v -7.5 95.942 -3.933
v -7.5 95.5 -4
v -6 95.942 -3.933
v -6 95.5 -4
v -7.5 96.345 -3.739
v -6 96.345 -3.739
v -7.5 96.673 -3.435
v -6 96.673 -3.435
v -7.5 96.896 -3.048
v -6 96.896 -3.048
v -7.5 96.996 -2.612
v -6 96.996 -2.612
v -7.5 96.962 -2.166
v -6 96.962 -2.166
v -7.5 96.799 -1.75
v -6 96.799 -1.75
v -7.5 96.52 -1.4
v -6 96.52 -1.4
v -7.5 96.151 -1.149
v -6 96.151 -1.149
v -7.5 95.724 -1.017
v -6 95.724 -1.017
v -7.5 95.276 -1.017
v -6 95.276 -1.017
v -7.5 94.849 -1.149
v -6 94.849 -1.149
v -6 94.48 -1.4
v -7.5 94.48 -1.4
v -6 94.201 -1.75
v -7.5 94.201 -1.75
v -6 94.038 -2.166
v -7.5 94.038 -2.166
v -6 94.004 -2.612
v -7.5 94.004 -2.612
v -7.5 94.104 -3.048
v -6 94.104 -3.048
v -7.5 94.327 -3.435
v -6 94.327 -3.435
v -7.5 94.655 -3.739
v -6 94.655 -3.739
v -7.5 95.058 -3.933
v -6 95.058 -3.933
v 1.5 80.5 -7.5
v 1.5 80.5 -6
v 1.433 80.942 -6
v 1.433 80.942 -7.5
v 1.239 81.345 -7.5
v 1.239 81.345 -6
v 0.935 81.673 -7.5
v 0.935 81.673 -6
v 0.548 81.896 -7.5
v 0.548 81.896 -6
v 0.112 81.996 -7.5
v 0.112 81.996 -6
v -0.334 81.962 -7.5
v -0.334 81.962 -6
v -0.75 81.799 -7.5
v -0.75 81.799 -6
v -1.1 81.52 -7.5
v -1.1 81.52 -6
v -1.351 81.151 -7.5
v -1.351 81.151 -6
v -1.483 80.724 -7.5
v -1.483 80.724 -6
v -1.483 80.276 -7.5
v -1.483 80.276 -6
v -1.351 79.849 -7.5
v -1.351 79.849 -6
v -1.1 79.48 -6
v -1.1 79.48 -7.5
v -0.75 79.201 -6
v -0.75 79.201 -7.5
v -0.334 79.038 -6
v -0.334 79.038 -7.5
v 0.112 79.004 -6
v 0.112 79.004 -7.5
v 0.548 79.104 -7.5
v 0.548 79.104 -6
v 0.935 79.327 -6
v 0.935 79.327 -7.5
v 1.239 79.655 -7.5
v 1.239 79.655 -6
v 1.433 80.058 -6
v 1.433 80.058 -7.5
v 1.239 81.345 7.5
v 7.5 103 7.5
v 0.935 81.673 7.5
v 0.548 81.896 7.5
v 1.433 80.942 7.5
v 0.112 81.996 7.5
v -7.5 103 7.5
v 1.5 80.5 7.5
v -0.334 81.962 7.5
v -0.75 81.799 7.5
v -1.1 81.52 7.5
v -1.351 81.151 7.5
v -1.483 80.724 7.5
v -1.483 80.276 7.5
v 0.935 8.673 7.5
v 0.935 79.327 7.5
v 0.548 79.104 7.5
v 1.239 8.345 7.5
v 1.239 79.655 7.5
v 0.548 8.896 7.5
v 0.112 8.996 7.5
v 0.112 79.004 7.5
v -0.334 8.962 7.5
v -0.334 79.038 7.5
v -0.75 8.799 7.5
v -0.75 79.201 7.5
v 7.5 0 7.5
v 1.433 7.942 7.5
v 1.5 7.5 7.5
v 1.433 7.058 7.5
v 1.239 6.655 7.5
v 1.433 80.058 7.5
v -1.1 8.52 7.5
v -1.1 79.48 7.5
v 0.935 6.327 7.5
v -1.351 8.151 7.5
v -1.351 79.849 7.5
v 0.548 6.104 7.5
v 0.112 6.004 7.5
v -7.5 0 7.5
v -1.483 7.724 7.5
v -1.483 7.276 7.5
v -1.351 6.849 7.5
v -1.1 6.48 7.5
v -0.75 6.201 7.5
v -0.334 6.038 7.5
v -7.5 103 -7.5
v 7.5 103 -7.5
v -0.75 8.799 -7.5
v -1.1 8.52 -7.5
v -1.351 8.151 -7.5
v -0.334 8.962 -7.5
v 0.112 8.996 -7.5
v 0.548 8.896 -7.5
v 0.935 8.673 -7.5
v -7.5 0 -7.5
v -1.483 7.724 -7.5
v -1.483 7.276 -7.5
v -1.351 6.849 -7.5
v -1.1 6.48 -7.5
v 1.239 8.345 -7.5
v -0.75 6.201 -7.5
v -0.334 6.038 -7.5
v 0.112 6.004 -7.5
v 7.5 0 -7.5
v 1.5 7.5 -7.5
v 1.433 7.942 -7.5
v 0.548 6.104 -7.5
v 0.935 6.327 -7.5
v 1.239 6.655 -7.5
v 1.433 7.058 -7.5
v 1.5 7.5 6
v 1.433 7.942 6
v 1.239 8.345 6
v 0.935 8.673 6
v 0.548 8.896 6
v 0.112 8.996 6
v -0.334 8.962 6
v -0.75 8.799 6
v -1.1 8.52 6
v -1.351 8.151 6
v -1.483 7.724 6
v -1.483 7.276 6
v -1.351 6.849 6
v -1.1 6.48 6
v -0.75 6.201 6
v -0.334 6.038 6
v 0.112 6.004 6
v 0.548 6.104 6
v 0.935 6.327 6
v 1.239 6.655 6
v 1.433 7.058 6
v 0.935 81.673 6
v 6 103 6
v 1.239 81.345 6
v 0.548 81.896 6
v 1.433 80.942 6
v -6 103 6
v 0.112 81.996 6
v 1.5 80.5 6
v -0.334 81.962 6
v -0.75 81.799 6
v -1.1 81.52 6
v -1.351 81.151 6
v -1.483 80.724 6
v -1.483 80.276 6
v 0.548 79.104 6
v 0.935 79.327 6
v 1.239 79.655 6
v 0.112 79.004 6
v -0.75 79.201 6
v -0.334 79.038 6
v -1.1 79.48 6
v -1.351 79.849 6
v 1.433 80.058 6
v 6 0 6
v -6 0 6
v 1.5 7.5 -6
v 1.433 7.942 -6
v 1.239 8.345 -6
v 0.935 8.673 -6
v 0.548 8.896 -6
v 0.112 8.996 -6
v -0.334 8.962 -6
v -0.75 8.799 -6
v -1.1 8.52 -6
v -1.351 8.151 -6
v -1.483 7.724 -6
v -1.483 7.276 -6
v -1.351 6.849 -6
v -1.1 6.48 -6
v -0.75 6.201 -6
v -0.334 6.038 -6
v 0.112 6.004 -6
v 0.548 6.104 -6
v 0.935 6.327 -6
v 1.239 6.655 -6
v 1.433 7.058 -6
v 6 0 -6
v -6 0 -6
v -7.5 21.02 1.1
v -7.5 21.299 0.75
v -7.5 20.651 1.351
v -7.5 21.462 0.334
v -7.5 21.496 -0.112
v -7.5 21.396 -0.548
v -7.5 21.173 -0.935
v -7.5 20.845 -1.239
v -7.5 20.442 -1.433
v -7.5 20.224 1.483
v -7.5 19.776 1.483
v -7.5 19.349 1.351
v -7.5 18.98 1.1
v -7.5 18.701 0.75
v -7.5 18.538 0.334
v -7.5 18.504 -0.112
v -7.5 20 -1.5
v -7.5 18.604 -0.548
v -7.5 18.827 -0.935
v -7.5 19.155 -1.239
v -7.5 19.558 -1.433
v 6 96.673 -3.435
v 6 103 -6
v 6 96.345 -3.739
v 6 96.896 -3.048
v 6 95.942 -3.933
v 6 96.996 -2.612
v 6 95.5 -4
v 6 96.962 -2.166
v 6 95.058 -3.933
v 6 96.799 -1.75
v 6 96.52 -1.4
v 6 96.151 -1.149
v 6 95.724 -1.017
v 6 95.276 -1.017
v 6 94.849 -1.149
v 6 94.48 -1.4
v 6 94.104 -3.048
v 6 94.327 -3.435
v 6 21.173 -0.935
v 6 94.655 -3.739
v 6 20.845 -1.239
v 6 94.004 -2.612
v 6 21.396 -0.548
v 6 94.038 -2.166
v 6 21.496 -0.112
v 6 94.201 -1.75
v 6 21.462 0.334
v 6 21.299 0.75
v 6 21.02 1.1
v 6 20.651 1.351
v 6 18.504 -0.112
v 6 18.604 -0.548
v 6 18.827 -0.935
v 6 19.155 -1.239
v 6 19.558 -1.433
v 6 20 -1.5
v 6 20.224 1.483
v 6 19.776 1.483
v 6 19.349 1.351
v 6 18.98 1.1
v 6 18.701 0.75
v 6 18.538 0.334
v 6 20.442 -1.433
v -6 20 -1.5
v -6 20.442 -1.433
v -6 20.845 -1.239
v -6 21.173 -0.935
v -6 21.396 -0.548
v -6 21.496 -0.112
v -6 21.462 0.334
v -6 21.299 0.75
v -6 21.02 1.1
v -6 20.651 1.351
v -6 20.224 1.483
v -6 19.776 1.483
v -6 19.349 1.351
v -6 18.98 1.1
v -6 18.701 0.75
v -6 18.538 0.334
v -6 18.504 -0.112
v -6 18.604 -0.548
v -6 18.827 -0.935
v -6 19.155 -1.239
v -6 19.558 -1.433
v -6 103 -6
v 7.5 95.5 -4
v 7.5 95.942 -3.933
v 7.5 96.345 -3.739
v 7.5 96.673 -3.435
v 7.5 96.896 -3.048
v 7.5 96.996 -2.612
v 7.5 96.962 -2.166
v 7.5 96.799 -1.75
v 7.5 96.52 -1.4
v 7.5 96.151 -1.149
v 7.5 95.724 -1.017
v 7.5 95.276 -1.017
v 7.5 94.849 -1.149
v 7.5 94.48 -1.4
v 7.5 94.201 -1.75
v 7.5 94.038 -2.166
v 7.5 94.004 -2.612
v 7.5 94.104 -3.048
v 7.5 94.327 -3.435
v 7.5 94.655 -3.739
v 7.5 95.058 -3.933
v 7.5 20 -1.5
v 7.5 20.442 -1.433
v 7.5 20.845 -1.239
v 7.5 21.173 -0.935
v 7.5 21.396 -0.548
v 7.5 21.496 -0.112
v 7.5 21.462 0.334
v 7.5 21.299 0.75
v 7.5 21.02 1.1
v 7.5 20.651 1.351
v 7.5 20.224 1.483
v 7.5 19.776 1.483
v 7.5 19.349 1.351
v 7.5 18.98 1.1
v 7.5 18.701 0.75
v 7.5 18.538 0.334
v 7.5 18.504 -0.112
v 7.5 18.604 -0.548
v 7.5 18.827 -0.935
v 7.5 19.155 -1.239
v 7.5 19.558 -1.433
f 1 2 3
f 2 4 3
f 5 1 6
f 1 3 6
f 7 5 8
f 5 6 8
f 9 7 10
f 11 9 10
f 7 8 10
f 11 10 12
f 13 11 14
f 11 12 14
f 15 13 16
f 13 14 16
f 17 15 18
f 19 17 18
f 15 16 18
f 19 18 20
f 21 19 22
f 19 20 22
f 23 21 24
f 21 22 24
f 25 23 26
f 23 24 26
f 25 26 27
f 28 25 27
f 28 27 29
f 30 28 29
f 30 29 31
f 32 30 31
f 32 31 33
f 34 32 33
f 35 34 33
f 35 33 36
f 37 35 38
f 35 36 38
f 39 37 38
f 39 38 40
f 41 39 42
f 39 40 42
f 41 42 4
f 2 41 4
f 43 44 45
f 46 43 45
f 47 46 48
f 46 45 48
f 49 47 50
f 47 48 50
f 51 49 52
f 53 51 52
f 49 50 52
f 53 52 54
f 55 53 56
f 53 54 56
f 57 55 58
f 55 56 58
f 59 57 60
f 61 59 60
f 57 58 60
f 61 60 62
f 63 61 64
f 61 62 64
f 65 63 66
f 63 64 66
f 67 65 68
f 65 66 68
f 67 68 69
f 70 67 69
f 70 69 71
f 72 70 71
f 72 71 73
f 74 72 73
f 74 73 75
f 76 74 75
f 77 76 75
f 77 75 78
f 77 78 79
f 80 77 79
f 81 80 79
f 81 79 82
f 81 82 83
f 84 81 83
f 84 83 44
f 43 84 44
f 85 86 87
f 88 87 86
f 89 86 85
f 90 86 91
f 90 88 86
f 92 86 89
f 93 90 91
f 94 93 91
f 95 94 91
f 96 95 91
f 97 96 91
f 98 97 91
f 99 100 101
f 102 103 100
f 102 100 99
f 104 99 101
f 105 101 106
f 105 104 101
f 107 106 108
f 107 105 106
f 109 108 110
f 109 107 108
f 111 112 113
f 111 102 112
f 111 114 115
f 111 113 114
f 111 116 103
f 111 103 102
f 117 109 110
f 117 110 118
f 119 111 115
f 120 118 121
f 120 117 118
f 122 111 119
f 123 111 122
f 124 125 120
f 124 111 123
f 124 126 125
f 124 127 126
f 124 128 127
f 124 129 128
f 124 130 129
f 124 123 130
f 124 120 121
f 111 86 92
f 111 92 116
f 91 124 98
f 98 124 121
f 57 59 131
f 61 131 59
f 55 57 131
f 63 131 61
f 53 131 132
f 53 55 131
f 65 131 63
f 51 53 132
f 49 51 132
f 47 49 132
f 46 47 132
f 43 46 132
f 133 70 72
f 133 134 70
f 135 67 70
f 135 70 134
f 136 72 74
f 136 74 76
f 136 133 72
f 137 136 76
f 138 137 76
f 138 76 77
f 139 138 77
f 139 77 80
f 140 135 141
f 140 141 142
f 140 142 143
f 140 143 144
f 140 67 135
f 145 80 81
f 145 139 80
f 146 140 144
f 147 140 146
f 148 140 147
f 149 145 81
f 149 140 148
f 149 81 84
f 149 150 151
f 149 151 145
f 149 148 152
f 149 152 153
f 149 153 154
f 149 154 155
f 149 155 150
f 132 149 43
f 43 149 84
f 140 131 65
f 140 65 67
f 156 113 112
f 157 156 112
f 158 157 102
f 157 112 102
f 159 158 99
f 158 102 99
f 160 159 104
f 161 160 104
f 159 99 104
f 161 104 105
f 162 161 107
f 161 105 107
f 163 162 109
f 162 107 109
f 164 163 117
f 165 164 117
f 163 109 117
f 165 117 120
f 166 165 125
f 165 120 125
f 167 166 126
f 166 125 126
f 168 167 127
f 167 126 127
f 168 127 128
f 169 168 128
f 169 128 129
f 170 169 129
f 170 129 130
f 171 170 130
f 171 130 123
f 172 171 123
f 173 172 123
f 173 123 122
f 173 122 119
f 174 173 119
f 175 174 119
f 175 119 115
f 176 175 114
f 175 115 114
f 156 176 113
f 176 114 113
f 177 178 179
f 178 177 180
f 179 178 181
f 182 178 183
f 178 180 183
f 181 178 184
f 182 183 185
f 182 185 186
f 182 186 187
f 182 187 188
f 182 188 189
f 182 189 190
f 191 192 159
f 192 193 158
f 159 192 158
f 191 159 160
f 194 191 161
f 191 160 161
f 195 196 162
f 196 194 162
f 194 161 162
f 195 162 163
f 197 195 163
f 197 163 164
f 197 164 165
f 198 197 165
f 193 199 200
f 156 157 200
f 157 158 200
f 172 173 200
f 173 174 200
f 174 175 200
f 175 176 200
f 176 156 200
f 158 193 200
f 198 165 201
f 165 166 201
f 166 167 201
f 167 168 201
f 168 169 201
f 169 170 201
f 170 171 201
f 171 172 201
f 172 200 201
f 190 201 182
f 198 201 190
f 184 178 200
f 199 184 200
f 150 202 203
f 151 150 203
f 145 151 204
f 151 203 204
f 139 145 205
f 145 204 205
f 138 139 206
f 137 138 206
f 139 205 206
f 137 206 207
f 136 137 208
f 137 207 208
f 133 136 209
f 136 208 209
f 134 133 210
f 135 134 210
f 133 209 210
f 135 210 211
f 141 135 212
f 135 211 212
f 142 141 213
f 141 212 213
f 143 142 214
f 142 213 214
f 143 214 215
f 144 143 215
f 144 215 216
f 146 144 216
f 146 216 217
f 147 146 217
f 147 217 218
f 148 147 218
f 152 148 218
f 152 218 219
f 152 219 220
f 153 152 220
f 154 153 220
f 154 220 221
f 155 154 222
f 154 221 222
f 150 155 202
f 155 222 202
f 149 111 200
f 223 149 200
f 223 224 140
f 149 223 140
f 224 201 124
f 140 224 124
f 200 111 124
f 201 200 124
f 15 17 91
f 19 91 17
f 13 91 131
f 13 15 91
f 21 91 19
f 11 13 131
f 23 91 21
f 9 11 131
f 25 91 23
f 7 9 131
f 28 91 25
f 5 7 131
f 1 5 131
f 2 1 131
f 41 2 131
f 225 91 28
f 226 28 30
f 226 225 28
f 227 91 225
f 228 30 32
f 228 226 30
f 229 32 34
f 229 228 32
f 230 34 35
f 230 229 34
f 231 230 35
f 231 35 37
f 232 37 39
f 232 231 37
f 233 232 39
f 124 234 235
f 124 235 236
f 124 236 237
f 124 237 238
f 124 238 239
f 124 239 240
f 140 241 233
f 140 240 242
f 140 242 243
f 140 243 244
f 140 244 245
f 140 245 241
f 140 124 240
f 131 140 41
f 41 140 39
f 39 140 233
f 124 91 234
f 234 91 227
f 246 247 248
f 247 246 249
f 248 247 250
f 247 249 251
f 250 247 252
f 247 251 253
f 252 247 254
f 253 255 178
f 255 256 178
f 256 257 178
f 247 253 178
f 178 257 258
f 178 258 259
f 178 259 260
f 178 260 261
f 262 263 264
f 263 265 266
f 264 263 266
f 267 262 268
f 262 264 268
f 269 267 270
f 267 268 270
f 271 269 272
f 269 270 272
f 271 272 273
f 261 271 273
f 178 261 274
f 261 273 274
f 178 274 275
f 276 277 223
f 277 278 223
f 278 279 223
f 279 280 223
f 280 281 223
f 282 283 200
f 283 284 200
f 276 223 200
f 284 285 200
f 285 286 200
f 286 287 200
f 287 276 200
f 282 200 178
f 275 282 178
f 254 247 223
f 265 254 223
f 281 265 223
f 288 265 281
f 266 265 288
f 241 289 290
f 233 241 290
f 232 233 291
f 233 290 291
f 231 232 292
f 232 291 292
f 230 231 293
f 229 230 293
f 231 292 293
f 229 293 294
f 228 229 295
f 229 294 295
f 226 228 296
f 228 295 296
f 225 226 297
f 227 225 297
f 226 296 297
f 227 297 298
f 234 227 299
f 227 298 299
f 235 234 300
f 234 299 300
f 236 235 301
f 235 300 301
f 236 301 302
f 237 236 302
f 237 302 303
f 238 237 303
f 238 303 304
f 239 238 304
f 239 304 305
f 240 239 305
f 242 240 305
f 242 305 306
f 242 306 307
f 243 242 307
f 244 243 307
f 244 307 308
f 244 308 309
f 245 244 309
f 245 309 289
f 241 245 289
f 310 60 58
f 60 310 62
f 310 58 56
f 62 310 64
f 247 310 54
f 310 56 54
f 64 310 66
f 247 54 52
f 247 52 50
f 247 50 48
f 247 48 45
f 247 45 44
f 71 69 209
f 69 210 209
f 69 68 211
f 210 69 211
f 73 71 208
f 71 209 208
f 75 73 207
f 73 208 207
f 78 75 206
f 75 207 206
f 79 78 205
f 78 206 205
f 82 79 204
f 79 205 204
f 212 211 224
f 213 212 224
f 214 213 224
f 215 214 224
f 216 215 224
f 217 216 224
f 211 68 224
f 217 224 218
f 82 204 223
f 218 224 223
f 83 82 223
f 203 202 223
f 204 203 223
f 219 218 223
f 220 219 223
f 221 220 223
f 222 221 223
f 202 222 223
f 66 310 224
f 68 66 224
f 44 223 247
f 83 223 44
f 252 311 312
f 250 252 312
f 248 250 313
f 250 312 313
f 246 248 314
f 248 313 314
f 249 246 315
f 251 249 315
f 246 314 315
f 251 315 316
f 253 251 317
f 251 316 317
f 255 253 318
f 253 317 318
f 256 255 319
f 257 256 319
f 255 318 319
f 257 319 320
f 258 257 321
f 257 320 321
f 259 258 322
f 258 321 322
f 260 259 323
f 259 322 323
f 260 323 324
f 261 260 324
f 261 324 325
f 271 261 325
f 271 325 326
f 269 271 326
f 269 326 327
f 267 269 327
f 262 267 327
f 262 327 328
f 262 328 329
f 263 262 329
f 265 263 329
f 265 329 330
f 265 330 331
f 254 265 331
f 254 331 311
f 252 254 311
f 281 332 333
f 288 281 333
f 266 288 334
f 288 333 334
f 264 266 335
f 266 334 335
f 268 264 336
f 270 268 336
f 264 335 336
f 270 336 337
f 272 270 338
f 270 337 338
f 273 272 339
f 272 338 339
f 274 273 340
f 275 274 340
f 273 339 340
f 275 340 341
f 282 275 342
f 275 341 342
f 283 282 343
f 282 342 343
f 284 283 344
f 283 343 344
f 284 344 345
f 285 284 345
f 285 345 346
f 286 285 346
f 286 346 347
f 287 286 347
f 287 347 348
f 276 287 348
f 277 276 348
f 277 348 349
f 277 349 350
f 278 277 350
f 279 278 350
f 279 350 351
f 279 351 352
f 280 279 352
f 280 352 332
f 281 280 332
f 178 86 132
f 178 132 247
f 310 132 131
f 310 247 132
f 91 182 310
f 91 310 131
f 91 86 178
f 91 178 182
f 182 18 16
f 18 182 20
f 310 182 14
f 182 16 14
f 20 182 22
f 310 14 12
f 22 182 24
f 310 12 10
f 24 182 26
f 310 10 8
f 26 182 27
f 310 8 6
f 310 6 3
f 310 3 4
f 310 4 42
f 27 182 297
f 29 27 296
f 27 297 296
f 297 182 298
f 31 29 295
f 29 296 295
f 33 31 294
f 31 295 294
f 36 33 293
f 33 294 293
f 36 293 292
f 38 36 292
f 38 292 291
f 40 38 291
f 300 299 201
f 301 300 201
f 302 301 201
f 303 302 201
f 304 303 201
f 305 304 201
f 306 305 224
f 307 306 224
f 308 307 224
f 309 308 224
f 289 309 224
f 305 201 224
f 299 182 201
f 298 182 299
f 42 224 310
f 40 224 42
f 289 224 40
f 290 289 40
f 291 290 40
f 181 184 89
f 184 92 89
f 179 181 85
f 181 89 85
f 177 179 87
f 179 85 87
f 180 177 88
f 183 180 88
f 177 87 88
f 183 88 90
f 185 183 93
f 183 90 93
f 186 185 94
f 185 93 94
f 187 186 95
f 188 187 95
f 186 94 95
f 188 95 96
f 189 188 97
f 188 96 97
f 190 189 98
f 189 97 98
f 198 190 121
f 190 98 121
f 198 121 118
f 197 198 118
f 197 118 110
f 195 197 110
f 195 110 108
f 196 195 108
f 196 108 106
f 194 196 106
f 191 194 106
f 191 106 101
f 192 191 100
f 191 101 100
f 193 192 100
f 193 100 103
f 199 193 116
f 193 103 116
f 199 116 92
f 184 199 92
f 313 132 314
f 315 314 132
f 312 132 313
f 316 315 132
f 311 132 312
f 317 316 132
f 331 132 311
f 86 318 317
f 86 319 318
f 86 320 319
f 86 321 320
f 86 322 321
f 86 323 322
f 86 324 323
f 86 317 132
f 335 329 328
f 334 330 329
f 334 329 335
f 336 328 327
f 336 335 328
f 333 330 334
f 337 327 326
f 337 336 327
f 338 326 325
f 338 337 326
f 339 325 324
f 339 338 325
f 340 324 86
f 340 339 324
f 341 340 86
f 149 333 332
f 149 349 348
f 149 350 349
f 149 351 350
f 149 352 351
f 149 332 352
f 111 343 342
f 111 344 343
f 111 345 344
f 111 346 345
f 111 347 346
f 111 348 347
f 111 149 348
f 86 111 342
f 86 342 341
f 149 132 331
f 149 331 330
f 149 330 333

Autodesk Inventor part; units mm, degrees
ref_plane "YZ Plane" through (0, 0, 0) normal (1, 0, 0) x (0, 1, 0)
ref_plane "XZ Plane" through (0, 0, 0) normal (0, 1, 0) x (-1, 0, 0)
ref_plane "XY Plane" through (0, 0, 0) normal (0, 0, 1) x (1, 0, 0)
sketch "スケッチ1" plane through (0, 0, 0) normal (0, 1, 0) x (-1, 0, 0)
  line L0 (7.5, -7.5) -> (-7.5, -7.5)
  line L1 (-7.5, -7.5) -> (-7.5, 7.5)
  line L2 (-7.5, 7.5) -> (7.5, 7.5)
  line L3 (7.5, 7.5) -> (7.5, -7.5)
  line L4 (7.5, -7.5) -> (-7.5, 7.5) construction
  line L5 (-7.5, -7.5) -> (7.5, 7.5) construction
  line L6 (6, -6) -> (-6, -6)
  line L7 (-6, -6) -> (-6, 6)
  line L8 (-6, 6) -> (6, 6)
  line L9 (6, 6) -> (6, -6)
  point P0 (0, 0)
  dimension "d0" = 15
  dimension "d1" = 15
  dimension "d2" = 1.5
extrude "押し出し1" add sketch "スケッチ1" along normal blind 103
sketch "スケッチ2" plane through (-7.5, 0, 7.5) normal (0, 0, 1) x (1, 0, 0)
  line L0 (7.5, 0) -> (7.5, 103) construction
  line L1 (0, 103) -> (15, 103) projected
  line L2 (0, 0) -> (0, 103) projected
  line L3 (0, 51.5) -> (15, 51.5) construction
  line L4 (15, 0) -> (15, 103) projected
sketch "スケッチ3" plane through (7.5, 0, 7.5) normal (1, 0, 0) x (0, 0, -1)
  line L0 (7.5, 0) -> (7.5, 103) construction
  line L1 (0, 103) -> (15, 103) projected
  line L2 (15, 0) -> (15, 103) projected
  line L3 (15, 51.5) -> (0, 51.5) construction
  line L4 (0, 0) -> (0, 103) projected
sketch "スケッチ4" plane through (-7.5, 0, 7.5) normal (0, 0, 1) x (1, 0, 0)
  line L0 (7.5, 0) -> (7.5, 103) construction
  circle A0 centre (7.5, 7.5) radius 1.5
  line L1 (0, 0) -> (15, 0) projected
  circle A1 centre (7.5, 80.5) radius 1.5
  line L2 (0, 103) -> (15, 103) projected
  dimension "d5" = 3
  dimension "d6" = 7.5
  dimension "d13" = 3
  dimension "d23" = 22.5
extrude "押し出し2" cut sketch "スケッチ4" against normal through all
sketch "スケッチ5" plane through (7.5, 0, 7.5) normal (1, 0, 0) x (0, 0, -1)
  circle A0 centre (7.5, 20) radius 1.5
  line L0 (7.5, 0) -> (7.5, 103) construction
  line L1 (0, 0) -> (15, 0) projected
  circle A1 centre (10, 95.5) radius 1.5
  line L2 (0, 103) -> (15, 103) projected
  dimension "d9" = 3
  dimension "d10" = 20
  dimension "d15" = 3
  dimension "d16" = 7.5
  dimension "d24" = 2.5
extrude "押し出し3" cut sketch "スケッチ5" against normal through all
sketch "スケッチ6" plane through (7.5, 0, 7.5) normal (1, 0, 0) x (0, 0, -1)
  circle A0 centre (10, 95.5) radius 1.5 projected
  line L0 (0, 103) -> (15, 103) projected
  circle A1 centre (7.5, 20) radius 1.5 projected
  line L1 (0, 0) -> (15, 0) projected
  point P0 (7.5, 0)
  dimension "d17" = 7.5
  dimension "d18" = 83
  dimension "d19" = 103
sketch "スケッチ7" plane through (-7.5, 0, 7.5) normal (0, 0, 1) x (1, 0, 0)
  circle A0 centre (7.5, 80.5) radius 1.5 projected
  line L0 (0, 103) -> (15, 103) projected
  circle A1 centre (7.5, 7.5) radius 1.5 projected
  point P0 (7.5, 0)
  dimension "d20" = 22.5
  dimension "d21" = 95.5
equation "\"d1\" = d0"
properties part number "omu_k_jo_9" material "アルミニウム 6061-AHC"
